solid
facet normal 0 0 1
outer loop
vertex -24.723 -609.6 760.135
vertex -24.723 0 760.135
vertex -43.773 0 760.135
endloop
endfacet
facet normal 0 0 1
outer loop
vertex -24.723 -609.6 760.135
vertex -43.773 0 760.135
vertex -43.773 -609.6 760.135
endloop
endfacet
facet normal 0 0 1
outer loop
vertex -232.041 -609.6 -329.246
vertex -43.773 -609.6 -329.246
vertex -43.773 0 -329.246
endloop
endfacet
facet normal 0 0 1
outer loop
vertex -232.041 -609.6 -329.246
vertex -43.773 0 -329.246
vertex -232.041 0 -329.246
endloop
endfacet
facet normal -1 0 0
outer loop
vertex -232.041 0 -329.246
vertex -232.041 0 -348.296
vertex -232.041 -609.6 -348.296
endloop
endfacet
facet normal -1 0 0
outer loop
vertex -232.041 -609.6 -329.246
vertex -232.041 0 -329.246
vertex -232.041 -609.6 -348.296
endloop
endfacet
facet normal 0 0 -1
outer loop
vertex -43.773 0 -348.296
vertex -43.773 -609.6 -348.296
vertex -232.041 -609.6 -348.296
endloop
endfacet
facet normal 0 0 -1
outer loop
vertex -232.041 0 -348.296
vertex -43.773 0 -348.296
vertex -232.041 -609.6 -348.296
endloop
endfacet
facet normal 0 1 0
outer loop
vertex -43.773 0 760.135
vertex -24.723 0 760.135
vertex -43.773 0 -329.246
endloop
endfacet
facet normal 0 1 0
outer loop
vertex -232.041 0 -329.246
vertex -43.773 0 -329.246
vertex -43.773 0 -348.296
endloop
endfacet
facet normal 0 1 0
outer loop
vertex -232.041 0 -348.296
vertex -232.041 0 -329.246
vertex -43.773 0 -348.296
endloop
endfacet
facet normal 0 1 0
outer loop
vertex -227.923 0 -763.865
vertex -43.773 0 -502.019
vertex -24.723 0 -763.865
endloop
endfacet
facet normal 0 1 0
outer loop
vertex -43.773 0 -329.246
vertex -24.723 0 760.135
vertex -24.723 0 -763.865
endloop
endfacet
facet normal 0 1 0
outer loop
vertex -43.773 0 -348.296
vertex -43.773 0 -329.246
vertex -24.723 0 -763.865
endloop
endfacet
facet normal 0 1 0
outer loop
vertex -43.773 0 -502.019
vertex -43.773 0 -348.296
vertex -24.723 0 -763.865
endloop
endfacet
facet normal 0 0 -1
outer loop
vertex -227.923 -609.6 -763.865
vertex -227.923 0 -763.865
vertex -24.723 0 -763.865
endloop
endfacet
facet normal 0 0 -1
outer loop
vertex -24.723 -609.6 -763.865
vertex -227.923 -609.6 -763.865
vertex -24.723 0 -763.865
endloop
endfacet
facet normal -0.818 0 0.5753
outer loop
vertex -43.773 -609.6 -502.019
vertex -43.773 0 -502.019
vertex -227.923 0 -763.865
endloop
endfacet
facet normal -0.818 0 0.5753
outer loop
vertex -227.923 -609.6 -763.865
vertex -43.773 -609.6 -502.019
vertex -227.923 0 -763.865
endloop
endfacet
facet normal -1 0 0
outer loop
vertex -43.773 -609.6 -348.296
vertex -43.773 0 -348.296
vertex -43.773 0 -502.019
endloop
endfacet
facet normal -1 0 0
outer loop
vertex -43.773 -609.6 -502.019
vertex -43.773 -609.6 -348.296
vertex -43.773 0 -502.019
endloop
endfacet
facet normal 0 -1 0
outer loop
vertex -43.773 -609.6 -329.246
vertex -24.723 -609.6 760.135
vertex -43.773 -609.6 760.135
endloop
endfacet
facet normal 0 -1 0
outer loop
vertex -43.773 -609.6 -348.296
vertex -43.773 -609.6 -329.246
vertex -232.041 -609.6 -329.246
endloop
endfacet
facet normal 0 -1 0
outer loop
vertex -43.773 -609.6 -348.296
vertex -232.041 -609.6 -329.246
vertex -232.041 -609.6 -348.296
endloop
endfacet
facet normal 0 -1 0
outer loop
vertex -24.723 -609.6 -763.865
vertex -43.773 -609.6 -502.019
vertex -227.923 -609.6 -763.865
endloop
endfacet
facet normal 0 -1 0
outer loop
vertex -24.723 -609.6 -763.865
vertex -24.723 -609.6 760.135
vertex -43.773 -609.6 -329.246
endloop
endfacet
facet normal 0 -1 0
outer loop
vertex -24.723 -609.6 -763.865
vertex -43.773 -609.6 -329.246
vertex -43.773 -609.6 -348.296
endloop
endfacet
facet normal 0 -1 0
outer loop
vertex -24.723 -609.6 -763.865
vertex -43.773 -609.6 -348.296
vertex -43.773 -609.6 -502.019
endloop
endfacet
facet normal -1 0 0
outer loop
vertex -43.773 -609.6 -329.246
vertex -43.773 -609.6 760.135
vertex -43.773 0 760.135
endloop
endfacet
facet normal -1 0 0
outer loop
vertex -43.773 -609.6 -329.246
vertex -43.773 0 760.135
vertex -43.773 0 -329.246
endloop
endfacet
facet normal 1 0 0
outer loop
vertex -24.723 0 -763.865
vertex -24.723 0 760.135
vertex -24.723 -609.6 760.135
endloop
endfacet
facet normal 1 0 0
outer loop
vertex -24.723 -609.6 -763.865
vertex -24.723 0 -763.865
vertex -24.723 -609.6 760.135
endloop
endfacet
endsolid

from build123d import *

# Parameters (mm, degrees)
F1_DEPTH = 19.05
F2_DEPTH = 609.6
F3_E0_W  = 1524
F3_E0_H  = 609.6
F4_DEPTH = 19.05
F5_DEPTH = 25.4
F6_E4_W  = 207.3184425354
F6_E4_H  = 609.6
F7_DEPTH = 19.05


with BuildPart() as f1:
    # F0 (on Front) → F1 (new body)
    with BuildSketch(Plane.XZ):
        Polygon((-24.7226779938, -763.8654754907), (-24.7226779938, -474.9317169189), (-227.9226779938, -763.8654754907), align=None)
    extrude(amount=F1_DEPTH)

    # F0 (on Front) → F2 (join)
    with BuildSketch(Plane.XZ):
        Polygon((-24.7226779938, -763.8654754907), (-24.7226779938, -474.9317169189), (-227.9226779938, -763.8654754907), align=None)
    extrude(amount=F2_DEPTH)

    # F3_E0 (on explicit) → F4 (join)
    with BuildSketch(Plane(origin=(-24.7226779938, 0, 760.1345245093), x_dir=(0, 0, -1), z_dir=(-1, 0, 0))):
        with Locations((762, 304.8)):
            Rectangle(F3_E0_W, F3_E0_H)
    extrude(amount=F4_DEPTH)

    # F0 (on Front) → F5 (join)
    with BuildSketch(Plane.XZ):
        Polygon((-24.7226779938, -763.8654754907), (-24.7226779938, -474.9317169189), (-227.9226779938, -763.8654754907), align=None)
    extrude(amount=F5_DEPTH)

    # F6_E4 (on explicit) → F7 (join)
    with BuildSketch(Plane(origin=(-24.7226779938, 0, -348.2956886292), x_dir=(-1, 0, 0), z_dir=(0, 0, 1))):
        with Locations((103.6592212677, 304.8)):
            Rectangle(F6_E4_W, F6_E4_H)
    extrude(amount=F7_DEPTH)


solid = f1.part
